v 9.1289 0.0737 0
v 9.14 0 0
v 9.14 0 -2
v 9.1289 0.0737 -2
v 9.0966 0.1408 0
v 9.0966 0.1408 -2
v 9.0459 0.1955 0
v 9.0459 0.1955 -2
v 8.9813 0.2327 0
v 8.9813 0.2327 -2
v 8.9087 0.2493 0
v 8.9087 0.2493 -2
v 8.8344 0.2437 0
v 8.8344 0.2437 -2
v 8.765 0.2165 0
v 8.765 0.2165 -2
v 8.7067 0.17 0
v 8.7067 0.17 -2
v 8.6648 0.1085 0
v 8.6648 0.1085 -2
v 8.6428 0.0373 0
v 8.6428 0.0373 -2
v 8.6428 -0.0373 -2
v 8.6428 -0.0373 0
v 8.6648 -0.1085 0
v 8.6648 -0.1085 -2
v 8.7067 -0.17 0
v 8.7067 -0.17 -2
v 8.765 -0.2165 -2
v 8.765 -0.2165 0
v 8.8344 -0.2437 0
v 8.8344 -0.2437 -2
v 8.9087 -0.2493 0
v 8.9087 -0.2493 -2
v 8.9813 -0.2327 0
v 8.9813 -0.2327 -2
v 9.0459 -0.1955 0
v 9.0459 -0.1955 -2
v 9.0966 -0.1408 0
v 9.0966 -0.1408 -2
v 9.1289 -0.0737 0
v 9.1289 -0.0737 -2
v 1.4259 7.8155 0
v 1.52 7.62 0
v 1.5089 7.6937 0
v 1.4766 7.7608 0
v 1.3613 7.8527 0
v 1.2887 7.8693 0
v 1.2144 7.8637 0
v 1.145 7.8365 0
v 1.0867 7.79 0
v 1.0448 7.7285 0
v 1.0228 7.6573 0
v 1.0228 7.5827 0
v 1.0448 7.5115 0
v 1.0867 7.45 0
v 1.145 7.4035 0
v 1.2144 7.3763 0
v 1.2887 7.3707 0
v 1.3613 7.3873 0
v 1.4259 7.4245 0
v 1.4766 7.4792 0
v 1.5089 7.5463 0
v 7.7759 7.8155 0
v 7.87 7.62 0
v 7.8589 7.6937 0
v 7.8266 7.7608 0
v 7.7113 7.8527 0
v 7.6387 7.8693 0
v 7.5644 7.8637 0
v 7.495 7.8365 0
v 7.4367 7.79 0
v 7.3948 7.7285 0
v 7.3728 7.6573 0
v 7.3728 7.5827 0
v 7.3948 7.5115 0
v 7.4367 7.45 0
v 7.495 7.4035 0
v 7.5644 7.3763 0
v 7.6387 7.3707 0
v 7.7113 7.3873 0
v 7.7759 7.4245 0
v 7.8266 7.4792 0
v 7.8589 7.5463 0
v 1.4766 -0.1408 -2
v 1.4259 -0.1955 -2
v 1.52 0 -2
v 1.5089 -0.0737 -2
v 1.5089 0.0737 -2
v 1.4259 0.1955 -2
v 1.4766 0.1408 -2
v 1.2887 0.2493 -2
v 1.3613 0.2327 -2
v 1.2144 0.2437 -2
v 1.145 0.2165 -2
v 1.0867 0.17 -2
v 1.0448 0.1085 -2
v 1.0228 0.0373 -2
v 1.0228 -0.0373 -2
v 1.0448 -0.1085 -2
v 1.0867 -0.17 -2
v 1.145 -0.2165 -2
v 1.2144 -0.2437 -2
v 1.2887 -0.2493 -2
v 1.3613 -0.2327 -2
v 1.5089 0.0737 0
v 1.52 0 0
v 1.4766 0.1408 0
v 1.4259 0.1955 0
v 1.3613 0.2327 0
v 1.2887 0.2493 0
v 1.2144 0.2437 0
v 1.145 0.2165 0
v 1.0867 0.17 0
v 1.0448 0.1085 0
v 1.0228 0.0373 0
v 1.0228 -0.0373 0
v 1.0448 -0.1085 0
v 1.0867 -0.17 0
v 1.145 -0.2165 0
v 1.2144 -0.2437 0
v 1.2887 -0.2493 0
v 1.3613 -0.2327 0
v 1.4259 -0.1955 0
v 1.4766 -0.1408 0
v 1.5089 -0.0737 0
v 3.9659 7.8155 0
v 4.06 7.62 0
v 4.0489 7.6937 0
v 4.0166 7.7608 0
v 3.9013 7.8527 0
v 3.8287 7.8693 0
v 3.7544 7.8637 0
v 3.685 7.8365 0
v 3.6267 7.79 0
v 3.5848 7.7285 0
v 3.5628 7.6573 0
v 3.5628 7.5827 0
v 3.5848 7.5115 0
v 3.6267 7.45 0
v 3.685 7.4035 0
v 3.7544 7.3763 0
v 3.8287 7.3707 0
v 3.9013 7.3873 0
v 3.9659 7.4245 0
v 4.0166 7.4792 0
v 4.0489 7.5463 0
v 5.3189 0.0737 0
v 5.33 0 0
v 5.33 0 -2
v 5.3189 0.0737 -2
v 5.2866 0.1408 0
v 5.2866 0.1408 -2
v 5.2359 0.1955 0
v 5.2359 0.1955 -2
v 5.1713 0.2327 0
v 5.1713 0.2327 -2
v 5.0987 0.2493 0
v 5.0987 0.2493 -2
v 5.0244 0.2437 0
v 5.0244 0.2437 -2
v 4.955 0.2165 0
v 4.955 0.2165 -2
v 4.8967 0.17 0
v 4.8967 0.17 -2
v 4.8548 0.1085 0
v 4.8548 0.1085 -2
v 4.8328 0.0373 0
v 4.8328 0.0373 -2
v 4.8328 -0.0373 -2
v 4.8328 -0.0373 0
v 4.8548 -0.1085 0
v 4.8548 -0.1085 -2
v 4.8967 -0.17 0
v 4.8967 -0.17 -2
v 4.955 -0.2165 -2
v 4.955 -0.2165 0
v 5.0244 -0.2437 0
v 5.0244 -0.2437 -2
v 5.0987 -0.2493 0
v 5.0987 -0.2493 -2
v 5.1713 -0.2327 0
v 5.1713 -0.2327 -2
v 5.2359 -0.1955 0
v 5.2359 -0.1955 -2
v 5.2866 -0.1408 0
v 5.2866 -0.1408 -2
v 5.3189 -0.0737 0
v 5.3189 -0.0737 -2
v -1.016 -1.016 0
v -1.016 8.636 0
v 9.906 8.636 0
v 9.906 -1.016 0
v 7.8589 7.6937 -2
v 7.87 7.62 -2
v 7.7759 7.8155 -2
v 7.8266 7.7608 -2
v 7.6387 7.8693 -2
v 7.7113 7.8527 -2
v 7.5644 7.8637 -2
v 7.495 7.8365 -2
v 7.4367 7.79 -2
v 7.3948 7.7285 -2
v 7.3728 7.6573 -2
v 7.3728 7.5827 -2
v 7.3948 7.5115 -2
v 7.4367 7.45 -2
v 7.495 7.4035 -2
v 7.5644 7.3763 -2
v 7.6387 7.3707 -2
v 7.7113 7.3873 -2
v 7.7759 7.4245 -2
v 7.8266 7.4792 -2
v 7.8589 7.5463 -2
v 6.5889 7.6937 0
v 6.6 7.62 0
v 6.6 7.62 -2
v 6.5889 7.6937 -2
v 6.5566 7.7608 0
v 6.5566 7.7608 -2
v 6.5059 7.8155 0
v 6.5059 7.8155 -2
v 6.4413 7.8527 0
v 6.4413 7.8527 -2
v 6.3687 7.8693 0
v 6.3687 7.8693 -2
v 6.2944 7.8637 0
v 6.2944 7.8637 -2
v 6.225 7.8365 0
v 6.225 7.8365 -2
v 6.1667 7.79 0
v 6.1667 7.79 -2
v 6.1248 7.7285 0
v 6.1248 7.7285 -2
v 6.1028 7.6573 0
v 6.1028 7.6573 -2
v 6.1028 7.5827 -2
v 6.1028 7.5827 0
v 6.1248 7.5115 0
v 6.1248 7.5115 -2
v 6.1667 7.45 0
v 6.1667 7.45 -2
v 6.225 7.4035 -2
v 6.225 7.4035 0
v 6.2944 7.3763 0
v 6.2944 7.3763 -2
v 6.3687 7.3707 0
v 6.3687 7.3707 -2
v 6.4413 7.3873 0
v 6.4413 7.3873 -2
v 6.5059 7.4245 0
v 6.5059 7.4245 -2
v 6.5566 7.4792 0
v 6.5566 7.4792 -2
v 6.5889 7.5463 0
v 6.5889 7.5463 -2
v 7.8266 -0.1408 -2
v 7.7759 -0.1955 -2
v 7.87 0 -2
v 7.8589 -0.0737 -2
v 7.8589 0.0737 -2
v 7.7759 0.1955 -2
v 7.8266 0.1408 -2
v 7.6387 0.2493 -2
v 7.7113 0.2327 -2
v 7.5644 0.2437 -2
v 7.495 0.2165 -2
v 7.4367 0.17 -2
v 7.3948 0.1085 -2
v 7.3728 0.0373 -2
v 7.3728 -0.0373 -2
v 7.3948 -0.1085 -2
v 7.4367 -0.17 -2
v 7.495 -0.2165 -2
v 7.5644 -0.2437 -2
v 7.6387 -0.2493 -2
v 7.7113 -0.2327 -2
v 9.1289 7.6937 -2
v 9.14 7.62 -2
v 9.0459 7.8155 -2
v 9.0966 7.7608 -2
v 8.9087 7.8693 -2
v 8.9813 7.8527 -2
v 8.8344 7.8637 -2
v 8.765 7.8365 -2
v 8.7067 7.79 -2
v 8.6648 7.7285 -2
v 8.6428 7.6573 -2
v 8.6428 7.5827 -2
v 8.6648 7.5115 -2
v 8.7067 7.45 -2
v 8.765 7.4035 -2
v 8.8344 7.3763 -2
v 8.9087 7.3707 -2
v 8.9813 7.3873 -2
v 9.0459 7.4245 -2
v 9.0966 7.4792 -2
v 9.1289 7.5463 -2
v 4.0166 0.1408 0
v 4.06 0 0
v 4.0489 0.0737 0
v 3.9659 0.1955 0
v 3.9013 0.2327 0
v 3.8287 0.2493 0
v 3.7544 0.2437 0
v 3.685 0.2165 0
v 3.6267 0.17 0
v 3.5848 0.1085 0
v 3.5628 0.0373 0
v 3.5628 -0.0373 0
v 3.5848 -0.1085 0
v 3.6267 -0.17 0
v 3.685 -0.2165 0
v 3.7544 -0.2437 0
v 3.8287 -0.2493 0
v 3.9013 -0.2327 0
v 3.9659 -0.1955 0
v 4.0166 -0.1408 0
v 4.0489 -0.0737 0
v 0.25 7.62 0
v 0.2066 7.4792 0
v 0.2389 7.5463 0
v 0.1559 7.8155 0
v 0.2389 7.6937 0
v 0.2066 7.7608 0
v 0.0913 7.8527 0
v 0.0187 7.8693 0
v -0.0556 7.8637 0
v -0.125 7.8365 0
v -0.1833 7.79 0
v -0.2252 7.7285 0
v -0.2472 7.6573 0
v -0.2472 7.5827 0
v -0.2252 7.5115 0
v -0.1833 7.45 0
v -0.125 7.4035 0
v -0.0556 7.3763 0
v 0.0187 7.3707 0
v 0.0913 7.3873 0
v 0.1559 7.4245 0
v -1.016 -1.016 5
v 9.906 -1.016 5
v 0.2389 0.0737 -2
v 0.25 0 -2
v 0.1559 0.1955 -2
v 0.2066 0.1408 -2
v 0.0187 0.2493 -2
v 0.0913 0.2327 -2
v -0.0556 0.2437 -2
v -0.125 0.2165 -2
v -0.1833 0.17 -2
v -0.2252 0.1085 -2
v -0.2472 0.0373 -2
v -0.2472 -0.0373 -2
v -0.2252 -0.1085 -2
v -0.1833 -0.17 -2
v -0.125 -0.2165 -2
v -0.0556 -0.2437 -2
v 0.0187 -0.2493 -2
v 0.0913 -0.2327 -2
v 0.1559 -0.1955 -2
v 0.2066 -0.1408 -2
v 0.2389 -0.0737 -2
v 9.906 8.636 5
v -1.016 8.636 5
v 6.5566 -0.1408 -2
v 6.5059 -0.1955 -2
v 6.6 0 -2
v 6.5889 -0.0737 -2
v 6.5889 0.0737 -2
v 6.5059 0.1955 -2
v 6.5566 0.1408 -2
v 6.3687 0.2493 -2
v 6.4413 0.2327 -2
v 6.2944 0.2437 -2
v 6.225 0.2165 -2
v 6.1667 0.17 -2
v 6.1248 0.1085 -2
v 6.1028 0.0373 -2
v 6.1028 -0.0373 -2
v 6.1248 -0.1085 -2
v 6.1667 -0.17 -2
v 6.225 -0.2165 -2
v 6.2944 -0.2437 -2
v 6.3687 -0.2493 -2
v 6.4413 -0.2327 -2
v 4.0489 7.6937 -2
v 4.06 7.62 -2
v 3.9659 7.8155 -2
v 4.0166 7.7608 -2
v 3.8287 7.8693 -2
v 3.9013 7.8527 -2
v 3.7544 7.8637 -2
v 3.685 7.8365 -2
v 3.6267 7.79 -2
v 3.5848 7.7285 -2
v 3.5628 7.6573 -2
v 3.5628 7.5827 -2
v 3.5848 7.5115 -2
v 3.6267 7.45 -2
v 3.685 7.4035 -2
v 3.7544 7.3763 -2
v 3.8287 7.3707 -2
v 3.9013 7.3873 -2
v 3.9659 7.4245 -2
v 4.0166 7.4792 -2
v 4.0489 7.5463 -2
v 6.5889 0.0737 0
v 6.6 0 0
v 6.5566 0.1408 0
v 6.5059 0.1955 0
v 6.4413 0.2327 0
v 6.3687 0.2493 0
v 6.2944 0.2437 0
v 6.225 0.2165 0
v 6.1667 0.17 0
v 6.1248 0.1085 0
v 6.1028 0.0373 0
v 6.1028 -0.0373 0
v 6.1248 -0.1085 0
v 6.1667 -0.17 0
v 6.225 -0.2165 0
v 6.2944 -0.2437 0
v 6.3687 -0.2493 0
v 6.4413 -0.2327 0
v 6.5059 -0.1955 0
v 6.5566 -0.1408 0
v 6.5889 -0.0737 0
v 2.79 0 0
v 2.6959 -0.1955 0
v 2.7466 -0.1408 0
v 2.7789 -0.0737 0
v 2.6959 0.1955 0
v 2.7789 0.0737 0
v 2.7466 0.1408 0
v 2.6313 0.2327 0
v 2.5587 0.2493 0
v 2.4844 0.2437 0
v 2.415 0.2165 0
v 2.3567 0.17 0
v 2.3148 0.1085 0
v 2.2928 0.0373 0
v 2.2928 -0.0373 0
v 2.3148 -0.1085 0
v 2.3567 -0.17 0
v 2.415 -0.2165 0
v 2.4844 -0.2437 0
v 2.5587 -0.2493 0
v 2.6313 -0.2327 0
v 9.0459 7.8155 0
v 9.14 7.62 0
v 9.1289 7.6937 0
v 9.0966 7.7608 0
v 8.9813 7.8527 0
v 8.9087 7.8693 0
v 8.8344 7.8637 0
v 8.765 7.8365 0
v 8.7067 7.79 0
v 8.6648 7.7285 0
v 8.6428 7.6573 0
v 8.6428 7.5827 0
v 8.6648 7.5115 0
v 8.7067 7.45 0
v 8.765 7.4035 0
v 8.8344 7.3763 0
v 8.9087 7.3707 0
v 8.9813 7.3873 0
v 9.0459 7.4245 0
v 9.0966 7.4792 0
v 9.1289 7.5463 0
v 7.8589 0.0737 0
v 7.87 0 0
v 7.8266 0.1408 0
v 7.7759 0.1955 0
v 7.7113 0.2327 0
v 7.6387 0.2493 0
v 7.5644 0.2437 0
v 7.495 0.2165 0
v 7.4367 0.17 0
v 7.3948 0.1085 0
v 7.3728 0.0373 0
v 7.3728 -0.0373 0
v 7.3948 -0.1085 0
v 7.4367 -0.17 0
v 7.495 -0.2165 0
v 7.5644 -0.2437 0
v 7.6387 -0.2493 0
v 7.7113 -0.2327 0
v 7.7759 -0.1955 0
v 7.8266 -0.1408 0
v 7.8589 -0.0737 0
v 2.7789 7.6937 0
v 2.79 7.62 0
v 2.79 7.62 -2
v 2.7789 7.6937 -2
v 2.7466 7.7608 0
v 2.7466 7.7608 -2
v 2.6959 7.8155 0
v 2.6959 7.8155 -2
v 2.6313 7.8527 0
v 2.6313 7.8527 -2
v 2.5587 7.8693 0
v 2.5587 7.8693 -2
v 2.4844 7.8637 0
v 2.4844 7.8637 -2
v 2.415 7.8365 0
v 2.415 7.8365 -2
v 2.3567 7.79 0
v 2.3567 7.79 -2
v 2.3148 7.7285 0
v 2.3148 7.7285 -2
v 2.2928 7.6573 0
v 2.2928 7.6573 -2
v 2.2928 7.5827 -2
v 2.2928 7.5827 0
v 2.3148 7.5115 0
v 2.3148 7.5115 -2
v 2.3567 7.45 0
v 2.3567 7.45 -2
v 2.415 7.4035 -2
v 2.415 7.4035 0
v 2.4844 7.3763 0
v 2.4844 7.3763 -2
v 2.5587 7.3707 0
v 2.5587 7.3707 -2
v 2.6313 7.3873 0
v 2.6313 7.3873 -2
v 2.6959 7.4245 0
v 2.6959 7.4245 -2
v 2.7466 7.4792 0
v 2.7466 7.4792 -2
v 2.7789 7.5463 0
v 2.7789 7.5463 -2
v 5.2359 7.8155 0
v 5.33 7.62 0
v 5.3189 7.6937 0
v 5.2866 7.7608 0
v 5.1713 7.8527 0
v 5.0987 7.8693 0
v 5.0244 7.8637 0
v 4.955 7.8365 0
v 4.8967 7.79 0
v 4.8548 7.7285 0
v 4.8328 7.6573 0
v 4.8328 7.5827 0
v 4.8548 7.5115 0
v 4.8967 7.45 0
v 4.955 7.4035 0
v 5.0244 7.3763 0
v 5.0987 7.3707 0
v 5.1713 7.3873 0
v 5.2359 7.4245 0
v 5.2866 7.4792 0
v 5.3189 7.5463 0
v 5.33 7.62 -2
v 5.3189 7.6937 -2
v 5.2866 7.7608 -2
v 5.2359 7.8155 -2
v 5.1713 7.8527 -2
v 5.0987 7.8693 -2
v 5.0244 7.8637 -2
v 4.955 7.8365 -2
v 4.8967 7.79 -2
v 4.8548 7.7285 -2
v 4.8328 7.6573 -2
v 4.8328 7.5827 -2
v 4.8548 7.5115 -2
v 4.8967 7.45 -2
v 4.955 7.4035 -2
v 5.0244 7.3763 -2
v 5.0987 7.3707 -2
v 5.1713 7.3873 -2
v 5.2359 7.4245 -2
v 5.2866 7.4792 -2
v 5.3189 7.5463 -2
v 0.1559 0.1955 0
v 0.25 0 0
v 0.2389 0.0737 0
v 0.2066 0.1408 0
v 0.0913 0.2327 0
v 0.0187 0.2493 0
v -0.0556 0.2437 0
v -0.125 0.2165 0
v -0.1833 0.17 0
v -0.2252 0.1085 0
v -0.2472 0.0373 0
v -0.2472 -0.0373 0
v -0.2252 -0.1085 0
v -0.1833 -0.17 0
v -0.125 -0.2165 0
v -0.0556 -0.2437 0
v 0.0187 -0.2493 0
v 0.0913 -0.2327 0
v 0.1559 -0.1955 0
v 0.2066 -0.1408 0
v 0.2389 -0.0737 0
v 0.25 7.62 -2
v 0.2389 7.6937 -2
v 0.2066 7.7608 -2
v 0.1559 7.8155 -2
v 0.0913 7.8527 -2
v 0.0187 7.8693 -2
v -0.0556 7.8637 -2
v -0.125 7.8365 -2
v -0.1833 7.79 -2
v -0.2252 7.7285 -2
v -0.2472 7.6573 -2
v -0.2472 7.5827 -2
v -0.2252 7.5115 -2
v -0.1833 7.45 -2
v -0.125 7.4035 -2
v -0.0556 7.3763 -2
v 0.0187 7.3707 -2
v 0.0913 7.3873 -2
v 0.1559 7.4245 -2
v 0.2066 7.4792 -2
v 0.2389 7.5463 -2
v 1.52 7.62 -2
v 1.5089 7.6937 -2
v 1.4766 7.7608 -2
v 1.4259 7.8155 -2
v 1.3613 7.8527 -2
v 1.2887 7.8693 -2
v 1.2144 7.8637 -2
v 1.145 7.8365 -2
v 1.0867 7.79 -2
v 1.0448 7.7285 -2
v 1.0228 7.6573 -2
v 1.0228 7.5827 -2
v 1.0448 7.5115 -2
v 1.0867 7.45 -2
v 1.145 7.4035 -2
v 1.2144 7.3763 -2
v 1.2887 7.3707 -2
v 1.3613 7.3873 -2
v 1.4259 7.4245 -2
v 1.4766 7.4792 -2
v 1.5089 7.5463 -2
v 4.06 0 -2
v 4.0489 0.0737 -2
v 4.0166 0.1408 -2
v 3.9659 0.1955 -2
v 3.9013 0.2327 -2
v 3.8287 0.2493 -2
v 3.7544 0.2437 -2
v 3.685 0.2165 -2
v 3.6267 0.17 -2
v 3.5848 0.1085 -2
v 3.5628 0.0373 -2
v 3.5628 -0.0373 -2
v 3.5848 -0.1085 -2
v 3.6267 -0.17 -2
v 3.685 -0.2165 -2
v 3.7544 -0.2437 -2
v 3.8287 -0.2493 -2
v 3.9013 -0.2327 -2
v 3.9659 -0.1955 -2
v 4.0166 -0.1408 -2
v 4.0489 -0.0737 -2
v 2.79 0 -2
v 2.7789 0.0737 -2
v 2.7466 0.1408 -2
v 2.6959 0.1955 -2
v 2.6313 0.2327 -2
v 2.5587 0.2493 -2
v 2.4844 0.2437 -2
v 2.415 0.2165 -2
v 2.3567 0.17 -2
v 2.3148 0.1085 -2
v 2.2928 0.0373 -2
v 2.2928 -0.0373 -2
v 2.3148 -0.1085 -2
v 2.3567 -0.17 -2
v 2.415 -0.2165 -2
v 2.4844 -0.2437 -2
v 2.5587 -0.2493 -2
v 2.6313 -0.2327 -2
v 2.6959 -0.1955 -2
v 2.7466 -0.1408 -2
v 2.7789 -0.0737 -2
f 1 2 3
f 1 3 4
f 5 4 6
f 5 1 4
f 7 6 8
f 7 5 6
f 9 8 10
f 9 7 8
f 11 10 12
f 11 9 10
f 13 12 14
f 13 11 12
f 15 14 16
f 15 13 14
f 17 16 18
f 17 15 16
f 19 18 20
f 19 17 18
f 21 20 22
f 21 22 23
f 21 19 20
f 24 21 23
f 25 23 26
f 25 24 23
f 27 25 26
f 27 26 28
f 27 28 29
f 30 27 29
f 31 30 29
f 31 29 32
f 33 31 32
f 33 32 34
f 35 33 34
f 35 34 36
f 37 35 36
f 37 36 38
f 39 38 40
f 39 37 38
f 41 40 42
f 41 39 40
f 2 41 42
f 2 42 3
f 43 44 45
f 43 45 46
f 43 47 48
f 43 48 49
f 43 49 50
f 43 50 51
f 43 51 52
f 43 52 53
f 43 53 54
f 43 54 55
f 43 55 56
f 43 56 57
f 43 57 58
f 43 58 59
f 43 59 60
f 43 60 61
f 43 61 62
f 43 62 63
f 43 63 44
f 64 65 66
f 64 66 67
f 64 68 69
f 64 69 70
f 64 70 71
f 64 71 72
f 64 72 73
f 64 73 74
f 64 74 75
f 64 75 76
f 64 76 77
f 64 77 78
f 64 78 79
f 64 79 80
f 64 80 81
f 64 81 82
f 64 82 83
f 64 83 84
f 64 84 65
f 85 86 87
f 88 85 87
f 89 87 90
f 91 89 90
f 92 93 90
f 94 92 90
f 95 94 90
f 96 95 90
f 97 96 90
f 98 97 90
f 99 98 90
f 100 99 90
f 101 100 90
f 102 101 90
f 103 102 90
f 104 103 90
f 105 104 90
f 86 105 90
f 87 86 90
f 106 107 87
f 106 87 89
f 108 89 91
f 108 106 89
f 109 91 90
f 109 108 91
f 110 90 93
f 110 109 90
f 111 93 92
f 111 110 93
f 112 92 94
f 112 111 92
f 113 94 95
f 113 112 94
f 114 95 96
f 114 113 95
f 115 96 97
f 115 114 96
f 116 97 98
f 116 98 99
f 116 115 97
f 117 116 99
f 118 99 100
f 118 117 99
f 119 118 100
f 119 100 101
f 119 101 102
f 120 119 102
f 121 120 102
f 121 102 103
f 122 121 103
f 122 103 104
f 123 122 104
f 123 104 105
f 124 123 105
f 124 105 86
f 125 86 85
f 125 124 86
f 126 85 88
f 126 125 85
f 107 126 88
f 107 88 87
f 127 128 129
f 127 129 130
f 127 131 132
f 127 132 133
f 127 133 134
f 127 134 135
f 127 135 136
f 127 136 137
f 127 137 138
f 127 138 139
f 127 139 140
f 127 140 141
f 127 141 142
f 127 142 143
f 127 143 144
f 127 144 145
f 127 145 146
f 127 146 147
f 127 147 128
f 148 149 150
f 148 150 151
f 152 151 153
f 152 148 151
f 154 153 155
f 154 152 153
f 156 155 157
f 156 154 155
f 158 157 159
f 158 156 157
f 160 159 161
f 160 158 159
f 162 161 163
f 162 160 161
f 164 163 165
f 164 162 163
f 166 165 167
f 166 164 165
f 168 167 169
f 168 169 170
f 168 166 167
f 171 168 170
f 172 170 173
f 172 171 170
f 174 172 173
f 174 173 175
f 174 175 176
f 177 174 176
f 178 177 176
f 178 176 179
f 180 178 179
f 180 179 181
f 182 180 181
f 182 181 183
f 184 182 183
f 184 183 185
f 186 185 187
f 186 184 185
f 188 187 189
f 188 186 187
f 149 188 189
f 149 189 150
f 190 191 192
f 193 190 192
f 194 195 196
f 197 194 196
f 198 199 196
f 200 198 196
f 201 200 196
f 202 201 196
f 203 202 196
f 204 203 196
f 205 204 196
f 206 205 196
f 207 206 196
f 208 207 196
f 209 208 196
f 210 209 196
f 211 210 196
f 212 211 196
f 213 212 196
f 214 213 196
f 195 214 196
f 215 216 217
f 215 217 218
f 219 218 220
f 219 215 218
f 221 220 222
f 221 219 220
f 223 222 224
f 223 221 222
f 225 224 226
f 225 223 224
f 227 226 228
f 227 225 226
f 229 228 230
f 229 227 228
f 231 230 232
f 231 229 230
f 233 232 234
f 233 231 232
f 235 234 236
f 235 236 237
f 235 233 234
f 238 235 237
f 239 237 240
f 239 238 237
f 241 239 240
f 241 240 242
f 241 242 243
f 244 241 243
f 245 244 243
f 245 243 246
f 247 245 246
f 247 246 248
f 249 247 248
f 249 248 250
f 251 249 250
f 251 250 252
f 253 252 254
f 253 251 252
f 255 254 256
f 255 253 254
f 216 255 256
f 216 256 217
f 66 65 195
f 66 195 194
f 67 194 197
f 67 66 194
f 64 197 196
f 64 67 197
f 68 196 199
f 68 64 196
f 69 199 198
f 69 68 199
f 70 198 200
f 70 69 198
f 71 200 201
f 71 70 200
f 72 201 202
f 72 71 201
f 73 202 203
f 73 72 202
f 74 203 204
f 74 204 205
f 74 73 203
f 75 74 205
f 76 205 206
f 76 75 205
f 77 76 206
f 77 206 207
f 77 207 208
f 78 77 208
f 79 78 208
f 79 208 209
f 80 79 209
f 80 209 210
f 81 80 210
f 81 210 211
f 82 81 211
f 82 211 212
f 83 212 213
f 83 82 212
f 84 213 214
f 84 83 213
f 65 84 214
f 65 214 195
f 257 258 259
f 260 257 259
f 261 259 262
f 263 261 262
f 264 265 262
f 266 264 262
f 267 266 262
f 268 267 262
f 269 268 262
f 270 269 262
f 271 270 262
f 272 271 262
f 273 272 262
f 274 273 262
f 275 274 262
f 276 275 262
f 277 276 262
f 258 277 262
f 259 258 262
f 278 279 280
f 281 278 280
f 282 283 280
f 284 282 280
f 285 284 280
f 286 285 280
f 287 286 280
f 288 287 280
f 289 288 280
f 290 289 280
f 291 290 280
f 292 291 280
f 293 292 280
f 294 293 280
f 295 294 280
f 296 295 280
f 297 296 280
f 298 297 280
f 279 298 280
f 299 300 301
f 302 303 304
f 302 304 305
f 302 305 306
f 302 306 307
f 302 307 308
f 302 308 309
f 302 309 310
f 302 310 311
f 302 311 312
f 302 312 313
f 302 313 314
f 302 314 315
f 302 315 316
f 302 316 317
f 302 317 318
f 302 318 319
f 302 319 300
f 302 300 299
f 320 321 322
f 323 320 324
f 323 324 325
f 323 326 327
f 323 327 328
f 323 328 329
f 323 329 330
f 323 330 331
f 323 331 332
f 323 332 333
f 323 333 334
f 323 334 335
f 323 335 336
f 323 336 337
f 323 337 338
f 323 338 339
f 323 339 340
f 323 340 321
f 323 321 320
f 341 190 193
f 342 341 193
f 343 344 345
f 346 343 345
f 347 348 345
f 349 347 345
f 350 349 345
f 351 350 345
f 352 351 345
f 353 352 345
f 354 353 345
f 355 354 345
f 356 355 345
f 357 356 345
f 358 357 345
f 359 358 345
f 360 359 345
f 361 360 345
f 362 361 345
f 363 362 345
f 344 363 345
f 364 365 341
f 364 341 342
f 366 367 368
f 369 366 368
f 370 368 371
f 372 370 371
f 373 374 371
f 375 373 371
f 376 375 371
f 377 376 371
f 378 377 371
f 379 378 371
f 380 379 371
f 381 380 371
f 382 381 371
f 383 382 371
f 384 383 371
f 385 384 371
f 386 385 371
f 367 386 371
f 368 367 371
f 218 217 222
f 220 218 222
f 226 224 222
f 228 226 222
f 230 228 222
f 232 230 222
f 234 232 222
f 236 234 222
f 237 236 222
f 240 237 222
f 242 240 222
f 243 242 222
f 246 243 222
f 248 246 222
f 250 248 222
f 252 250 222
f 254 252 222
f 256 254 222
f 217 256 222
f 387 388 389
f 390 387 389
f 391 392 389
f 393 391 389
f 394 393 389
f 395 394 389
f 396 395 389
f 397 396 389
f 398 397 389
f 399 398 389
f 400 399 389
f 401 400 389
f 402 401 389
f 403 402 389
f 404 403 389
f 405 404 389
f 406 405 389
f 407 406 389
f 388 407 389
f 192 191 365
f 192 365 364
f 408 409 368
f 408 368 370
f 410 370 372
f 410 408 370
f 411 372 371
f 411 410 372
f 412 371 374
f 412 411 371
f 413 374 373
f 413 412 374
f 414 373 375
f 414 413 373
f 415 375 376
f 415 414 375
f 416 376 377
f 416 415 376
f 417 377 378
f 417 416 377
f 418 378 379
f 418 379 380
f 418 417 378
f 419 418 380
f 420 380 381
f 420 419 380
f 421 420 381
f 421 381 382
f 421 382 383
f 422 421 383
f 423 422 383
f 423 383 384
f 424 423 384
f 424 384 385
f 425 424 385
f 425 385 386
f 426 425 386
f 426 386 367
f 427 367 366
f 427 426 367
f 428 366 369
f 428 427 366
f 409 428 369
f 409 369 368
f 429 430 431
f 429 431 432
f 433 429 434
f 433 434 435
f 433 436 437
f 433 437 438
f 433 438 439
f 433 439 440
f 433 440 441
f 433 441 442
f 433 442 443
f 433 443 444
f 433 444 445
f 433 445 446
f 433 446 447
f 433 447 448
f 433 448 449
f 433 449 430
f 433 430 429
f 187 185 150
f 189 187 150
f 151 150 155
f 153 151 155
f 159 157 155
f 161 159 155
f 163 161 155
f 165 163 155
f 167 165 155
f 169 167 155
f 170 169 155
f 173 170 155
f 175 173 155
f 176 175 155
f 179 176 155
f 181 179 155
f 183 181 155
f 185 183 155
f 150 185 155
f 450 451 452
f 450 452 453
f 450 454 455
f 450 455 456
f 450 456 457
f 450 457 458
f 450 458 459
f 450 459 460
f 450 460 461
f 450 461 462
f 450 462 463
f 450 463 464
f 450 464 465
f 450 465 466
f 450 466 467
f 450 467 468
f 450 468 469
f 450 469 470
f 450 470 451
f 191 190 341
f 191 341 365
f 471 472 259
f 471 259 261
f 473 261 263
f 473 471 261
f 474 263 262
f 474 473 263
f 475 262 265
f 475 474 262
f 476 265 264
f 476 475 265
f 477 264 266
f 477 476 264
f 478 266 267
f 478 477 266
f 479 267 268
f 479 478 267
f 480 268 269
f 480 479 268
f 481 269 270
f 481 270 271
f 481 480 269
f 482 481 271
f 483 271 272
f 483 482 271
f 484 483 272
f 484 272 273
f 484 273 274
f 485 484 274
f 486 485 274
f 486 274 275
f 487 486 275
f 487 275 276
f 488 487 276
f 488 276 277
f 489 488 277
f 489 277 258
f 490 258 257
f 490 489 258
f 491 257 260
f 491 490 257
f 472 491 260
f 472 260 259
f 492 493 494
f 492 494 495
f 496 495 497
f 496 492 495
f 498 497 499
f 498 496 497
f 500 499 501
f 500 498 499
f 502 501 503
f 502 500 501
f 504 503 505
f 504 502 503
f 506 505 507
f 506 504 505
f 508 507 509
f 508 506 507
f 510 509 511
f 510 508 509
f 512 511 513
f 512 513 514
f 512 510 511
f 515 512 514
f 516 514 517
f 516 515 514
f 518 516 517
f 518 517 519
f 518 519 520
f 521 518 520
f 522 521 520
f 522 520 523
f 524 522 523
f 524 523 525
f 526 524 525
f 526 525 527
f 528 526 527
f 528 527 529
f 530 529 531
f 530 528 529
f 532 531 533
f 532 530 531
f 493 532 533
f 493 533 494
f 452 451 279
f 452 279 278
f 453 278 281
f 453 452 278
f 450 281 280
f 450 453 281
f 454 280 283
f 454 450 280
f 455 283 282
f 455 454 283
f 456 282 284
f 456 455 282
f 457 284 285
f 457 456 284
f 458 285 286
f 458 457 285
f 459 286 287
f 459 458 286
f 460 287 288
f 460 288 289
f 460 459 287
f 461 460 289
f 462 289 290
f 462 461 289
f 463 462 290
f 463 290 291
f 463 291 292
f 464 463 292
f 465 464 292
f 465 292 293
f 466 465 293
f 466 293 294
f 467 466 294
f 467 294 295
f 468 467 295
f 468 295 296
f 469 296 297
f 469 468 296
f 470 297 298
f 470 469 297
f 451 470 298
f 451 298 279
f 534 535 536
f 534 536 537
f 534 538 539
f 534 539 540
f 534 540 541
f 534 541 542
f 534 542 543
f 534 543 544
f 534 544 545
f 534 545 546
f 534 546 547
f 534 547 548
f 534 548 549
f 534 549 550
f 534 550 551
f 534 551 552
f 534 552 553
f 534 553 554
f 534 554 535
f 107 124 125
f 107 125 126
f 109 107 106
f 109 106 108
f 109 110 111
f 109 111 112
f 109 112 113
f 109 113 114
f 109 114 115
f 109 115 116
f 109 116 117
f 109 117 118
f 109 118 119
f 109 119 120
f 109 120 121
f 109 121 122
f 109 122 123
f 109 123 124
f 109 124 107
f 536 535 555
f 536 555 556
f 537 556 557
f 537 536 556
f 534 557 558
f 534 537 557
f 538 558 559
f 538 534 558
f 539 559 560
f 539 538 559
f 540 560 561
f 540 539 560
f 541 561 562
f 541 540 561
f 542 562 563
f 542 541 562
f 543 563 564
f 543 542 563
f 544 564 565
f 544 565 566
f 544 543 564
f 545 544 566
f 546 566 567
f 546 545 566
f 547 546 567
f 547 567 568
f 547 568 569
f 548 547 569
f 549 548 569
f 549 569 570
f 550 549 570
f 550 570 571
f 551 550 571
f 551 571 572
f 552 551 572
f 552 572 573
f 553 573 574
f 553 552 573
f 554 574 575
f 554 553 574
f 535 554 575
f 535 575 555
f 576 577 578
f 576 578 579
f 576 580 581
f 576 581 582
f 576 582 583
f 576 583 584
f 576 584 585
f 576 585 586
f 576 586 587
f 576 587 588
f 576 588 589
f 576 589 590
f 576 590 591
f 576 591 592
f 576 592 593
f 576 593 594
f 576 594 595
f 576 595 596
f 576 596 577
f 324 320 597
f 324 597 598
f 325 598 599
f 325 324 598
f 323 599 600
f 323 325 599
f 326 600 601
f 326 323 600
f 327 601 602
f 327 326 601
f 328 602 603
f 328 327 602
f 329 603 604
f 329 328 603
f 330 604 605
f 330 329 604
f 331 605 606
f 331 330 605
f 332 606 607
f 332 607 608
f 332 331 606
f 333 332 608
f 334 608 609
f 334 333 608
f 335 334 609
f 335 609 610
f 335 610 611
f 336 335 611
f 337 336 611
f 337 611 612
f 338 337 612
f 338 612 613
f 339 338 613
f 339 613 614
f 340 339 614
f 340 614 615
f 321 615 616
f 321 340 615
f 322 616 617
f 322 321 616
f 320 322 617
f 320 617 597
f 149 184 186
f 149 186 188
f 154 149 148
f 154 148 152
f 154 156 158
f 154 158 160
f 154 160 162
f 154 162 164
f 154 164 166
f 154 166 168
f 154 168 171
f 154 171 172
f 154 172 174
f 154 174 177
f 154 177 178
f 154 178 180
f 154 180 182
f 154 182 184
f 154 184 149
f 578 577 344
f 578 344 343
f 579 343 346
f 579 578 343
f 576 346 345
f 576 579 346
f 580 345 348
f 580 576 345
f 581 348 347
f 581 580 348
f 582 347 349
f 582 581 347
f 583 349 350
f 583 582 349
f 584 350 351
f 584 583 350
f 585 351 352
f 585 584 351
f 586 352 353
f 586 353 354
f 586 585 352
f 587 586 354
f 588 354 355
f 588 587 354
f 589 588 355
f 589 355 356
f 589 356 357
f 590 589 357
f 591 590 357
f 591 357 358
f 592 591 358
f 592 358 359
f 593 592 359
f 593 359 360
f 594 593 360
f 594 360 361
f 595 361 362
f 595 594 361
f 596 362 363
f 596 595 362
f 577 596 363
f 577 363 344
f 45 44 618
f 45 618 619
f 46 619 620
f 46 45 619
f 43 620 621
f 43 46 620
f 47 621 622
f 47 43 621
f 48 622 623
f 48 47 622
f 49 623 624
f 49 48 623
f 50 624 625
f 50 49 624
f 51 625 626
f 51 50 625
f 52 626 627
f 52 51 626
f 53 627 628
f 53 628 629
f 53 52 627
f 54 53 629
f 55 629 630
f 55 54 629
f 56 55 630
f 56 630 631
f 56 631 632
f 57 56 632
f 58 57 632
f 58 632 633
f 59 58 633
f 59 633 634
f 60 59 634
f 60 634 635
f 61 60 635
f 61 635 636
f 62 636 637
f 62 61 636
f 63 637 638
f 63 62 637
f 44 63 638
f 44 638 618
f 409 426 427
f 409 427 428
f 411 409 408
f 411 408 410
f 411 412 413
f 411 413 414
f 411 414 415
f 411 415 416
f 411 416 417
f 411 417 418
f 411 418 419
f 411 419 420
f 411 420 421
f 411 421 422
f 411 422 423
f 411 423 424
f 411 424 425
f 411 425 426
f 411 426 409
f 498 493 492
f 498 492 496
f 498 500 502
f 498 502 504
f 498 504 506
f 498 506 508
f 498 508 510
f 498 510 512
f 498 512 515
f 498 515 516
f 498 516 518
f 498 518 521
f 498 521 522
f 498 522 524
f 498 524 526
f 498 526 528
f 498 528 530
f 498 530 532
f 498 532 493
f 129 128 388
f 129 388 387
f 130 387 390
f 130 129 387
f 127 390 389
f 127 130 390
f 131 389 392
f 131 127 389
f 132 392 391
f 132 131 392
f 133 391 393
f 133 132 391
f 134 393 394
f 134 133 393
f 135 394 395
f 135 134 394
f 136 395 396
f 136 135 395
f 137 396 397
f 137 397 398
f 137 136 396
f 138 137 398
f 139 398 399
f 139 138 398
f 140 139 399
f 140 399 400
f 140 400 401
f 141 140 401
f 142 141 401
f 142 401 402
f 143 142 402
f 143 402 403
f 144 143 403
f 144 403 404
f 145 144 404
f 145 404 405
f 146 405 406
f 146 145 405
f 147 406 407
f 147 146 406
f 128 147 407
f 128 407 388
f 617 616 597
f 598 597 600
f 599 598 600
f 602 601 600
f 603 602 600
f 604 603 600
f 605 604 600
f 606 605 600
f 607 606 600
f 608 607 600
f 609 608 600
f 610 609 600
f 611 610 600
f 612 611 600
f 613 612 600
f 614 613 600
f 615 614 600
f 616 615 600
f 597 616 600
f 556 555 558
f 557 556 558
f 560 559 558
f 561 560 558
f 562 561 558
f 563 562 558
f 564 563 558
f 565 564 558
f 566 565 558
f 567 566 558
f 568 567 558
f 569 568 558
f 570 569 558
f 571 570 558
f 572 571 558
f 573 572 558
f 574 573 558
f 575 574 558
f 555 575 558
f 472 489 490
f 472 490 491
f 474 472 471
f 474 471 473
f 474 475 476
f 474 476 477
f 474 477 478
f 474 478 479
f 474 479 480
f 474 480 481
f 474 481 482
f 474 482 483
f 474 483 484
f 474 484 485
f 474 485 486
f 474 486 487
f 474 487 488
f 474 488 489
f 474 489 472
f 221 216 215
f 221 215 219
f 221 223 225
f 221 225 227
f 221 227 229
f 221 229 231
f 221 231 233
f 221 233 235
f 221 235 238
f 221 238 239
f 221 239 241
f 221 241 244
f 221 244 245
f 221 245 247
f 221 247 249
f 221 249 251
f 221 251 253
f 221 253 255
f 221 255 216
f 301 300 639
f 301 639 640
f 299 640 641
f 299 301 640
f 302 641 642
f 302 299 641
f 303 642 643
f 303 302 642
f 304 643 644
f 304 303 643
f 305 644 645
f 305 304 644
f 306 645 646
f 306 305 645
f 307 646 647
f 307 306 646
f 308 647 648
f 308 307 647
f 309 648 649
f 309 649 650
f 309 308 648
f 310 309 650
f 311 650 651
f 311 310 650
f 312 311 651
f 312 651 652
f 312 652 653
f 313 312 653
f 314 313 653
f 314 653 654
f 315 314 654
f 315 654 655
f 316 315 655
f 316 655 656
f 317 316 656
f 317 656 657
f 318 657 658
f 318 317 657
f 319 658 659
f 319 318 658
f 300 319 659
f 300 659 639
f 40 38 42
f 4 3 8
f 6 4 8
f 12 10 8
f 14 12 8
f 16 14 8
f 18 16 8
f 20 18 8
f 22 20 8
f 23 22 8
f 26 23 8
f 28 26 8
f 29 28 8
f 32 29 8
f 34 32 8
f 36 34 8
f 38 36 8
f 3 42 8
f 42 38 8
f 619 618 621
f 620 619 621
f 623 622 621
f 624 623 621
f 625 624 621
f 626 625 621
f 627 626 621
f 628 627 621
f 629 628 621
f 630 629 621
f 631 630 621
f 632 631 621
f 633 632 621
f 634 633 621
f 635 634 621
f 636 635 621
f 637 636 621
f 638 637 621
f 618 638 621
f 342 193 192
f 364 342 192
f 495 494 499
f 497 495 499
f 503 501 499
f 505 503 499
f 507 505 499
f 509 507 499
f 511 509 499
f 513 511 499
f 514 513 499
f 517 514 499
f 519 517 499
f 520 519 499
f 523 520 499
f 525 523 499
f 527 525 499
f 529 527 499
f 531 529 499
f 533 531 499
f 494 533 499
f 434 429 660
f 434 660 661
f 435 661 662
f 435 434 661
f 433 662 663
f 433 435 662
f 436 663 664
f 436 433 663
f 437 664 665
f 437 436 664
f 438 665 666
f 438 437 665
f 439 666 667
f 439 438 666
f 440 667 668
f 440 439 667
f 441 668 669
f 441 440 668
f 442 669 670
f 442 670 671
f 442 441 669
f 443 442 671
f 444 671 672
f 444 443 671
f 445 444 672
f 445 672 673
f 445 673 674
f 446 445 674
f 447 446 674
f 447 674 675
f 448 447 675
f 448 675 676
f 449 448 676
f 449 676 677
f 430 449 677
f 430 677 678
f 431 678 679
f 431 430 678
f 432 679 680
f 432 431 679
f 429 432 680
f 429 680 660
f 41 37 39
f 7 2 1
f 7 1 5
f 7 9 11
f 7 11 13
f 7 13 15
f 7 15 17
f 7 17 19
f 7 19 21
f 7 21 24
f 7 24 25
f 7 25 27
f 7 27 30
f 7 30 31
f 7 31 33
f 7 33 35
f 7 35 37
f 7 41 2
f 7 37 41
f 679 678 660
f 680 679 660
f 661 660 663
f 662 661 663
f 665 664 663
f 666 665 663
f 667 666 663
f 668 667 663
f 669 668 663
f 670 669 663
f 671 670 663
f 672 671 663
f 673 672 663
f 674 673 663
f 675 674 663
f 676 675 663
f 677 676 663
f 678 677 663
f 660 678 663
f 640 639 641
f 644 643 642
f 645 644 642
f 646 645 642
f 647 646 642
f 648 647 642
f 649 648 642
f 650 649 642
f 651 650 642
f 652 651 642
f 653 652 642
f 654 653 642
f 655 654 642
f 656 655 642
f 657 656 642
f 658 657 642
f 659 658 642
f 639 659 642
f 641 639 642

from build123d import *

# Parameters (mm, degrees)
SKETCH1_W               = 10.922
SKETCH1_H               = 9.652
COMPONENT_OUTLINE_DEPTH = 5
SKETCH2_R               = 0.25
EXTRUDE_1_DEPTH         = 2
SKETCH3_R               = 0.25
EXTRUDE_2_DEPTH         = 2
SKETCH4_R               = 0.25
EXTRUDE_3_DEPTH         = 2
SKETCH5_R               = 0.25
EXTRUDE_4_DEPTH         = 2
SKETCH6_R               = 0.25
EXTRUDE_5_DEPTH         = 2
SKETCH7_R               = 0.25
EXTRUDE_6_DEPTH         = 2
SKETCH8_R               = 0.25
EXTRUDE_7_DEPTH         = 2
SKETCH9_R               = 0.25
EXTRUDE_8_DEPTH         = 2
SKETCH10_R              = 0.25
EXTRUDE_9_DEPTH         = 2
SKETCH11_R              = 0.25
EXTRUDE_10_DEPTH        = 2
SKETCH12_R              = 0.25
EXTRUDE_11_DEPTH        = 2
SKETCH13_R              = 0.25
EXTRUDE_12_DEPTH        = 2
SKETCH14_R              = 0.25
EXTRUDE_13_DEPTH        = 2
SKETCH15_R              = 0.25
EXTRUDE_14_DEPTH        = 2
SKETCH16_R              = 0.25
EXTRUDE_15_DEPTH        = 2
SKETCH17_R              = 0.25
EXTRUDE_16_DEPTH        = 2


with BuildPart() as part:
    # Sketch1 → Component_Outline (new body)
    with BuildSketch(Plane.XY):
        with Locations((4.445, 3.81)):
            Rectangle(SKETCH1_W, SKETCH1_H)
    extrude(amount=COMPONENT_OUTLINE_DEPTH)


with BuildPart() as body_2:
    # Sketch2 → Extrude 1 (new body)
    with BuildSketch(Plane.XY):
        Circle(SKETCH2_R)
    extrude(amount=-EXTRUDE_1_DEPTH)


with BuildPart() as body_3:
    # Sketch3 → Extrude 2 (new body)
    with BuildSketch(Plane.XY):
        with Locations((1.27, 0)):
            Circle(SKETCH3_R)
    extrude(amount=-EXTRUDE_2_DEPTH)


with BuildPart() as body_4:
    # Sketch4 → Extrude 3 (new body)
    with BuildSketch(Plane.XY):
        with Locations((2.54, 0)):
            Circle(SKETCH4_R)
    extrude(amount=-EXTRUDE_3_DEPTH)


with BuildPart() as body_5:
    # Sketch5 → Extrude 4 (new body)
    with BuildSketch(Plane.XY):
        with Locations((3.81, 0)):
            Circle(SKETCH5_R)
    extrude(amount=-EXTRUDE_4_DEPTH)


with BuildPart() as body_6:
    # Sketch6 → Extrude 5 (new body)
    with BuildSketch(Plane.XY):
        with Locations((5.08, 0)):
            Circle(SKETCH6_R)
    extrude(amount=-EXTRUDE_5_DEPTH)


with BuildPart() as body_7:
    # Sketch7 → Extrude 6 (new body)
    with BuildSketch(Plane.XY):
        with Locations((6.35, 0)):
            Circle(SKETCH7_R)
    extrude(amount=-EXTRUDE_6_DEPTH)


with BuildPart() as body_8:
    # Sketch8 → Extrude 7 (new body)
    with BuildSketch(Plane.XY):
        with Locations((7.62, 0)):
            Circle(SKETCH8_R)
    extrude(amount=-EXTRUDE_7_DEPTH)


with BuildPart() as body_9:
    # Sketch9 → Extrude 8 (new body)
    with BuildSketch(Plane.XY):
        with Locations((8.89, 0)):
            Circle(SKETCH9_R)
    extrude(amount=-EXTRUDE_8_DEPTH)


with BuildPart() as body_10:
    # Sketch10 → Extrude 9 (new body)
    with BuildSketch(Plane.XY):
        with Locations((8.89, 7.62)):
            Circle(SKETCH10_R)
    extrude(amount=-EXTRUDE_9_DEPTH)


with BuildPart() as body_11:
    # Sketch11 → Extrude 10 (new body)
    with BuildSketch(Plane.XY):
        with Locations((7.62, 7.62)):
            Circle(SKETCH11_R)
    extrude(amount=-EXTRUDE_10_DEPTH)


with BuildPart() as body_12:
    # Sketch12 → Extrude 11 (new body)
    with BuildSketch(Plane.XY):
        with Locations((6.35, 7.62)):
            Circle(SKETCH12_R)
    extrude(amount=-EXTRUDE_11_DEPTH)


with BuildPart() as body_13:
    # Sketch13 → Extrude 12 (new body)
    with BuildSketch(Plane.XY):
        with Locations((5.08, 7.62)):
            Circle(SKETCH13_R)
    extrude(amount=-EXTRUDE_12_DEPTH)


with BuildPart() as body_14:
    # Sketch14 → Extrude 13 (new body)
    with BuildSketch(Plane.XY):
        with Locations((3.81, 7.62)):
            Circle(SKETCH14_R)
    extrude(amount=-EXTRUDE_13_DEPTH)


with BuildPart() as body_15:
    # Sketch15 → Extrude 14 (new body)
    with BuildSketch(Plane.XY):
        with Locations((2.54, 7.62)):
            Circle(SKETCH15_R)
    extrude(amount=-EXTRUDE_14_DEPTH)


with BuildPart() as body_16:
    # Sketch16 → Extrude 15 (new body)
    with BuildSketch(Plane.XY):
        with Locations((1.27, 7.62)):
            Circle(SKETCH16_R)
    extrude(amount=-EXTRUDE_15_DEPTH)


with BuildPart() as body_17:
    # Sketch17 → Extrude 16 (new body)
    with BuildSketch(Plane.XY):
        with Locations((0, 7.62)):
            Circle(SKETCH17_R)
    extrude(amount=-EXTRUDE_16_DEPTH)


solid = Compound([part.part, body_2.part, body_3.part, body_4.part, body_5.part, body_6.part, body_7.part, body_8.part, body_9.part, body_10.part, body_11.part, body_12.part, body_13.part, body_14.part, body_15.part, body_16.part, body_17.part])
